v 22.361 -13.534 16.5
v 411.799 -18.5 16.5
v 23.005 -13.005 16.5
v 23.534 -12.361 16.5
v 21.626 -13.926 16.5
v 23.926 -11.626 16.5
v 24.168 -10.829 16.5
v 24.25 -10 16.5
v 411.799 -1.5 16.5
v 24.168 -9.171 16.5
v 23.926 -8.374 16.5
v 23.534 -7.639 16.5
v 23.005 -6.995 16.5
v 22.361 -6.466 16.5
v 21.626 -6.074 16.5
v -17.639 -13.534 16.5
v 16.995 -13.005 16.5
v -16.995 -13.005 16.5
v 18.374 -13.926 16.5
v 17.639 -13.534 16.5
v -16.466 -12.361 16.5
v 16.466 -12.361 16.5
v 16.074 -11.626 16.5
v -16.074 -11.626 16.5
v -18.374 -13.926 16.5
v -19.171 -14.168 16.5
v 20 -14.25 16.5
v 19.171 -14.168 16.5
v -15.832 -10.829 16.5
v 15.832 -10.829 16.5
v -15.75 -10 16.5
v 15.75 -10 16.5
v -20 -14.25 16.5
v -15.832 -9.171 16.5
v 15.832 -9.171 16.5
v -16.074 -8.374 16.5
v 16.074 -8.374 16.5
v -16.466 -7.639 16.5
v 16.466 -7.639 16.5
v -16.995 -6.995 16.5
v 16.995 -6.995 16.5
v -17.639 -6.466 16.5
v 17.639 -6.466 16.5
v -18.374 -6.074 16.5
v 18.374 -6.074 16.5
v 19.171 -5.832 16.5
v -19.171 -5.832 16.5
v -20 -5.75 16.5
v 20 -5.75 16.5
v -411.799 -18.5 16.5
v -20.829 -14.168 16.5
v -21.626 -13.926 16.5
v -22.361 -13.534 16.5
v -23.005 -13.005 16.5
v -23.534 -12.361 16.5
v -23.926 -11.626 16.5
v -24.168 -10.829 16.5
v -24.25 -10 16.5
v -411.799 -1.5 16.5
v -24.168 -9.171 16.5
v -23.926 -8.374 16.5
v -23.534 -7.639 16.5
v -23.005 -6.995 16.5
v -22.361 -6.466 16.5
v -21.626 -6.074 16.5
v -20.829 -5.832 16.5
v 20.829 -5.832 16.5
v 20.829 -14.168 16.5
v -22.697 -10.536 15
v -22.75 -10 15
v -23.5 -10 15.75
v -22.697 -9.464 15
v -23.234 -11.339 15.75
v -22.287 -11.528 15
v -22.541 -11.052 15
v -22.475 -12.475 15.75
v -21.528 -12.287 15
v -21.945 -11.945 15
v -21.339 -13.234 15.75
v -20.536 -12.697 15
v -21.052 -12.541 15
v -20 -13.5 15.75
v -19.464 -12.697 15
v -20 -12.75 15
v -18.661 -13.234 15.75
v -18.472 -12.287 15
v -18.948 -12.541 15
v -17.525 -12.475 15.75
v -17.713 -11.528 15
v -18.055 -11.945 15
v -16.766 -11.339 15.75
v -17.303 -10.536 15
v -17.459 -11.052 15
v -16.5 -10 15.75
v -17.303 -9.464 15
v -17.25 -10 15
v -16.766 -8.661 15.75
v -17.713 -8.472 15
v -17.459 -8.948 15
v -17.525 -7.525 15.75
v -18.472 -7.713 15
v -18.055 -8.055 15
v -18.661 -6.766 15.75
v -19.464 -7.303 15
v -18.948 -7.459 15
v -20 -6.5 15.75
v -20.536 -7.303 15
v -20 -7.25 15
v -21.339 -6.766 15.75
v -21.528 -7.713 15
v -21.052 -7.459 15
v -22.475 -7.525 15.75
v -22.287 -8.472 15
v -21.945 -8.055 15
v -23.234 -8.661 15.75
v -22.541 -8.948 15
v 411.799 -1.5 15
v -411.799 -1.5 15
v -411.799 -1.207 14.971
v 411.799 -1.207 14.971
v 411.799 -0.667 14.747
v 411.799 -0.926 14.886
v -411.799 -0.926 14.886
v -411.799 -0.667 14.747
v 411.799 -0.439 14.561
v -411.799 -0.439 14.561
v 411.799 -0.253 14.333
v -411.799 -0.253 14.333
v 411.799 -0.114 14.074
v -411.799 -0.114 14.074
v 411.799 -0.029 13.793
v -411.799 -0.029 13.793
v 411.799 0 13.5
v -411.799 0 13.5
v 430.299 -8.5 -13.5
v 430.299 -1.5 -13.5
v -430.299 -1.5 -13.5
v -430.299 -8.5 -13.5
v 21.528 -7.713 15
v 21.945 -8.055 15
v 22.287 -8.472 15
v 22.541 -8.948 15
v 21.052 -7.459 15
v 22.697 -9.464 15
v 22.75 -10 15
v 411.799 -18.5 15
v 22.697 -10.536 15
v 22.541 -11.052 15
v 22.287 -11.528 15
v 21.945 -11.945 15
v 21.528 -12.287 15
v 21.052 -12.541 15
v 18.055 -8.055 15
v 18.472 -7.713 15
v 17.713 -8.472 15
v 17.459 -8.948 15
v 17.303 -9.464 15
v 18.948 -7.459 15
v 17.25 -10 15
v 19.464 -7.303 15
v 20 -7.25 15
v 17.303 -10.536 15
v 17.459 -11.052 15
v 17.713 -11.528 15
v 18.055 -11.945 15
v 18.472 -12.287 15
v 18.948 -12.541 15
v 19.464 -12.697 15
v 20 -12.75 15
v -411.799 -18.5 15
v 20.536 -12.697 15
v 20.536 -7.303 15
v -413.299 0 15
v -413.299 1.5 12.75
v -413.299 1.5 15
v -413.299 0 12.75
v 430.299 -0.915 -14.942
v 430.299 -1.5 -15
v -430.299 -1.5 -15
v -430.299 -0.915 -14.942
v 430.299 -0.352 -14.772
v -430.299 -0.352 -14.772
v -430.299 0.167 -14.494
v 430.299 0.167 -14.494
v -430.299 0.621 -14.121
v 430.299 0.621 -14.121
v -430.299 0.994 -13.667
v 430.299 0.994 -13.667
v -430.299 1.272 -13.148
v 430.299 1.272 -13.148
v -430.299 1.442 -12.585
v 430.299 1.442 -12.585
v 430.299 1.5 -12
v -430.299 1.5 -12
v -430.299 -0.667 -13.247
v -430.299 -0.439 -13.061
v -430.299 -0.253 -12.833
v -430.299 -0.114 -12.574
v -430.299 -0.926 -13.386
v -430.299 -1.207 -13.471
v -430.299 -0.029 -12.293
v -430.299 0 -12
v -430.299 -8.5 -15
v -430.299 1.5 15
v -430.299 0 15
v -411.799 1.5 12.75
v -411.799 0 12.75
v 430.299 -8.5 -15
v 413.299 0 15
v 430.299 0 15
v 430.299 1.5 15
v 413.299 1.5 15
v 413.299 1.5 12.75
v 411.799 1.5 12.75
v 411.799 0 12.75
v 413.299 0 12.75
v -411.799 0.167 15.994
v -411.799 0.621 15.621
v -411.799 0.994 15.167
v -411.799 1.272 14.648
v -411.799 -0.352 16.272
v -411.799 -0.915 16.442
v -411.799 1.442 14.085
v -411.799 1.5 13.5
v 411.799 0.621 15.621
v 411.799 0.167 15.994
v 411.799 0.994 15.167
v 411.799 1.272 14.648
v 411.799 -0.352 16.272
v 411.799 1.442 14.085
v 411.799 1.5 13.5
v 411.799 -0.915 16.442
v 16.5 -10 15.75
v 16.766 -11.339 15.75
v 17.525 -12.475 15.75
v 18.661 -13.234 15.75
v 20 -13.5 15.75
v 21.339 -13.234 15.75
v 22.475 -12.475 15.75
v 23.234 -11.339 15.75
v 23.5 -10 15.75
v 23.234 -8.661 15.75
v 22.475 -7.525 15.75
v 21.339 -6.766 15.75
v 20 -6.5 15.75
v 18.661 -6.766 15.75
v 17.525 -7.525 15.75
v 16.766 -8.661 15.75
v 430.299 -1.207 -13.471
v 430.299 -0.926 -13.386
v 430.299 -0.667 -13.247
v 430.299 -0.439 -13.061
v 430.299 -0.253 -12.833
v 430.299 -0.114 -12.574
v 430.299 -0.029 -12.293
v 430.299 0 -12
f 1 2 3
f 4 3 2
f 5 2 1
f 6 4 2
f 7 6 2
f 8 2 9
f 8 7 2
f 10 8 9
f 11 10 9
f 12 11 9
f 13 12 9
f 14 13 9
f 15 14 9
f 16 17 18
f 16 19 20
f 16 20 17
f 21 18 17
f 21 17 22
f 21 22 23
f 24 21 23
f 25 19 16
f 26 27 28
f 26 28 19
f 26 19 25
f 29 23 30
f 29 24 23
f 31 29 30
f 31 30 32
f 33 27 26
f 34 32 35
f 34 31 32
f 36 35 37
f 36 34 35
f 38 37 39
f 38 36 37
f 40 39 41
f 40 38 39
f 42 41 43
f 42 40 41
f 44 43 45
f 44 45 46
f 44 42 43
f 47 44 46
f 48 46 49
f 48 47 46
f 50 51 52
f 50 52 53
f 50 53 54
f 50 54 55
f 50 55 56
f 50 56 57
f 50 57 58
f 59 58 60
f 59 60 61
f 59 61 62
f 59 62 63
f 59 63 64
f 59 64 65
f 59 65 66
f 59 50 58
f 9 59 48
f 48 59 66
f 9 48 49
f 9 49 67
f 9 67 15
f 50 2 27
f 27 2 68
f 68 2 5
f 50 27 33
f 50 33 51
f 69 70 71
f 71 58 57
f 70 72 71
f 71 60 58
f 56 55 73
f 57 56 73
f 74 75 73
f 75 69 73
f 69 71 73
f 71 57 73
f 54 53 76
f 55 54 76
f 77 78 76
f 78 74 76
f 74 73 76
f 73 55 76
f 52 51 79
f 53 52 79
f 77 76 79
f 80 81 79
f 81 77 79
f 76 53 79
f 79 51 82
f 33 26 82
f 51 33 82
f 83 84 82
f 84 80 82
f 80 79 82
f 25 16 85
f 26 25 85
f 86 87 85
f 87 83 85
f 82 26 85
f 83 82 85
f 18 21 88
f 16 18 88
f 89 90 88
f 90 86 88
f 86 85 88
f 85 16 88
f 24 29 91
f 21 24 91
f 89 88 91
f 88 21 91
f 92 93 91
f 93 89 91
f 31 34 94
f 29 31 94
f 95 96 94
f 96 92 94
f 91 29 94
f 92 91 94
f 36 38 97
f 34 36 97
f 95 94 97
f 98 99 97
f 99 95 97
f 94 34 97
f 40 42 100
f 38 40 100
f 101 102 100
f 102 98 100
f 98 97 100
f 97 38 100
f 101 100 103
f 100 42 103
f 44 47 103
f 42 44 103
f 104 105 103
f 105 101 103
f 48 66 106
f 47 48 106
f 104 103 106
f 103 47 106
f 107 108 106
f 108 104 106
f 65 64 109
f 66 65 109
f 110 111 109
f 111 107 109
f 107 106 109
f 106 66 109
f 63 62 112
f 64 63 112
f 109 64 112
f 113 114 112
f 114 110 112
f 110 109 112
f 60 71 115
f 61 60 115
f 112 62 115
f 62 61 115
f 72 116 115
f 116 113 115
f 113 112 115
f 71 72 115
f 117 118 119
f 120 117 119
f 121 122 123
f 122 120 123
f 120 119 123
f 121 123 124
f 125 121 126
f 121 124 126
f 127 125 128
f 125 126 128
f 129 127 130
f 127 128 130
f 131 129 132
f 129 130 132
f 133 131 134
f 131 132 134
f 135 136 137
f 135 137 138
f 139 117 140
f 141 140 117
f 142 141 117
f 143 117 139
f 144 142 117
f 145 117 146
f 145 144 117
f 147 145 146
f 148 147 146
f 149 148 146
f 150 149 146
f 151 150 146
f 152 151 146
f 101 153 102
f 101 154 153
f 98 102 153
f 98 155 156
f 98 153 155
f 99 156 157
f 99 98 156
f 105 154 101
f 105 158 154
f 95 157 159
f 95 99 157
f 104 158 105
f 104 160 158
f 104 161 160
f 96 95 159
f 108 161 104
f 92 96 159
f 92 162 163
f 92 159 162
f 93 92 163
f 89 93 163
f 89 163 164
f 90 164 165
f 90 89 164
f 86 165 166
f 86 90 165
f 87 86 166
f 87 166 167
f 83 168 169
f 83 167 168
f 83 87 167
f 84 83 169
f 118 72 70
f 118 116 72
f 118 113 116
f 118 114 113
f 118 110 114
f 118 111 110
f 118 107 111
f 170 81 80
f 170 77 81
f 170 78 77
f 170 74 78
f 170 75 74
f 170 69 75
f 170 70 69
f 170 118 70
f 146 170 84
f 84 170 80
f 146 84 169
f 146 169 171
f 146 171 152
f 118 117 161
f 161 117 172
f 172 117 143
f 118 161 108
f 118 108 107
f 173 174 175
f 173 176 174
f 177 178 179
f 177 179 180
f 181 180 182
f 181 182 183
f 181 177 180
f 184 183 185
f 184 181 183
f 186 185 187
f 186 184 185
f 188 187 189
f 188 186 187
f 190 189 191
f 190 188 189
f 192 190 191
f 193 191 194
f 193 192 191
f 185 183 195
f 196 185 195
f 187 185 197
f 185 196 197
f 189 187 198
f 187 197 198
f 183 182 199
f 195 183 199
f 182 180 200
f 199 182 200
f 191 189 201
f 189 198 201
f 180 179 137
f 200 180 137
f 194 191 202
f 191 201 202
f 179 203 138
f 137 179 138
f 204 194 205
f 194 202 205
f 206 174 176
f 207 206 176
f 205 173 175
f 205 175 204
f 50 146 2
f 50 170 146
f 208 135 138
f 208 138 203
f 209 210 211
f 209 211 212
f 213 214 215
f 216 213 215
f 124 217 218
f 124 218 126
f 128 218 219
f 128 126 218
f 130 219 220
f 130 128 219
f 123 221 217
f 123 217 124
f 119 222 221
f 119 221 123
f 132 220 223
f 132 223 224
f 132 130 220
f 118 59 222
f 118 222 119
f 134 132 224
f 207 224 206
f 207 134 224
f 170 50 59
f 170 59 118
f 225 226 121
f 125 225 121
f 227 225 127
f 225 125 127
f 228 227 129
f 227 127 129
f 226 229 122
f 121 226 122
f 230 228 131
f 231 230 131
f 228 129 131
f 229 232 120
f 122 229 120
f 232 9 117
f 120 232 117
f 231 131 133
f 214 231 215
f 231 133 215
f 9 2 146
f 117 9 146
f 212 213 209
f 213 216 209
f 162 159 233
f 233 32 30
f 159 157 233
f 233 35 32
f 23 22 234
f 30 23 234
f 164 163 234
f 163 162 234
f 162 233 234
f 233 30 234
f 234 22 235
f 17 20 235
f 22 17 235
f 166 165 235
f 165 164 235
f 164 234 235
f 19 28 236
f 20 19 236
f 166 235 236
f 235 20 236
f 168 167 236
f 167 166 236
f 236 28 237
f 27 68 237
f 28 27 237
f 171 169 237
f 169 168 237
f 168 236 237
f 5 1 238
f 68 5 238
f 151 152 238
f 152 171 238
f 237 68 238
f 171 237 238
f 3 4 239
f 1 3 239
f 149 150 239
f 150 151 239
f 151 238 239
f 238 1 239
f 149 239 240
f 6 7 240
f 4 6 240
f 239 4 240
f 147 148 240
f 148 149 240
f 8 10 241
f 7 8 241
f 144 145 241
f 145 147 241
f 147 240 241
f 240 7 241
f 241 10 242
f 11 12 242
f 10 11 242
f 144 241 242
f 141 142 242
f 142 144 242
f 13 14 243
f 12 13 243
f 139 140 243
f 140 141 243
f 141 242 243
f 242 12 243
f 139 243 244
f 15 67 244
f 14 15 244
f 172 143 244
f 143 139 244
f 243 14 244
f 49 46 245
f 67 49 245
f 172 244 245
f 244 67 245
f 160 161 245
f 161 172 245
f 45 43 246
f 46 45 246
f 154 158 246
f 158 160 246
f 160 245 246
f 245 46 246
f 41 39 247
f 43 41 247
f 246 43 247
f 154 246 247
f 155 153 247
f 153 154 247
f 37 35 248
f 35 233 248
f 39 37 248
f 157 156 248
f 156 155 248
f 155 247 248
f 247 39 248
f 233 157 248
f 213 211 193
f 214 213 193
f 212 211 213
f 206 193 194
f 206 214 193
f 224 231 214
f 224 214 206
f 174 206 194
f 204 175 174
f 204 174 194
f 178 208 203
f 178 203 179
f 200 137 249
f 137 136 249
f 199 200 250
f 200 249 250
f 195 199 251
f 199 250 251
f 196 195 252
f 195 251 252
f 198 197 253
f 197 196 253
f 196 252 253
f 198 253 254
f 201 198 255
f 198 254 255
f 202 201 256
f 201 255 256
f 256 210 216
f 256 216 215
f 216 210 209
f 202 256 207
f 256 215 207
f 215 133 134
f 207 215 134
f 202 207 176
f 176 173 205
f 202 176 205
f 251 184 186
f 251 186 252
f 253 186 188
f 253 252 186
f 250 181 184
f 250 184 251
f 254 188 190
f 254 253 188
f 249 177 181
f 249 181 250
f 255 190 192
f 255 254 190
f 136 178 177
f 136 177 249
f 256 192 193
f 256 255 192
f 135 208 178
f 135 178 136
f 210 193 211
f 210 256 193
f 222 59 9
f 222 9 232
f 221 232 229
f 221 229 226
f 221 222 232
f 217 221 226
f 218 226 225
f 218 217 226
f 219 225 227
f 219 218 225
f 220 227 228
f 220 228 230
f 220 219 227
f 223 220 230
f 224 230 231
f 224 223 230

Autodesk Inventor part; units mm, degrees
ref_plane "YZ Plane" through (0, 0, 0) normal (1, 0, 0) x (0, 1, 0)
ref_plane "XZ Plane" through (0, 0, 0) normal (0, 1, 0) x (-1, 0, 0)
ref_plane "XY Plane" through (0, 0, 0) normal (0, 0, 1) x (1, 0, 0)
sketch "Sketch2" plane through (0, 0, 0) normal (0, 1, 0) x (-1, 0, 0)
  line L0 (-430.299, 15) -> (430.299, 15)
  line L1 (430.299, 15) -> (430.299, -15)
  line L2 (430.299, -15) -> (-430.299, -15)
  line L3 (-430.299, -15) -> (-430.299, 15)
  line L4 (-430.299, 15) -> (430.299, -15) construction
  line L5 (430.299, 15) -> (-430.299, -15) construction
  point P0 (0, 0)
  dimension "d12" = 860.598
  dimension "d13" = 30
extrude "Plate2" add sketch "Sketch2" along normal blind 1.5
sketch "Sketch3" plane through (-430.299, 0, 15) normal (0, 0, 1) x (1, 0, 0)
  line L0 (842.098, 0) -> (18.5, 0)
  line L1 (18.5, 0) -> (18.5, -18.5)
  line L2 (18.5, -18.5) -> (842.098, -18.5)
  line L3 (842.098, -18.5) -> (842.098, 0)
edge flange "Flange1" height 20 angle 90 thickness 1.5 bend radius 1.5 thickness toward (0, 0, 1) relief straight relief width 1.5 relief depth 0.75 edges at (0, 0, 15) wall of the first edge with corners at (411.799, 0, 15) (-411.799, 0, 15) (-411.799, -18.5, 15) (411.799, -18.5, 15)
bend "Bend2"
corner "Corner2"
sketch "Sketch4" plane through (430.299, 1.5, -13.5) normal (0, 0, -1) x (-1, 0, 0)
  line L0 (860.598, 0) -> (0, 0)
  line L1 (0, 0) -> (0, -10)
  line L2 (0, -10) -> (860.598, -10)
  line L3 (860.598, -10) -> (860.598, 0)
edge flange "Flange2" height 10 angle 90 thickness 1.5 bend radius 1.5 thickness toward (0, 0, -1) relief tear relief width 1.5 relief depth 0.75 edges at (0, 0, -15) wall of the first edge with corners at (-430.299, 1.5, -13.5) (430.299, 1.5, -13.5) (430.299, -8.5, -13.5) (-430.299, -8.5, -13.5)
bend "Bend3"
corner "Corner3"
sketch "Sketch5" plane through (411.799, -18.5, 15) normal (0, 0, -1) x (-1, 0, 0)
  circle A0 centre (391.799, 8.5) radius 2.067 construction
  circle A1 centre (431.799, 8.5) radius 2.067 construction
  circle A2 centre (391.799, 8.5) radius 2.75
  circle A3 centre (431.799, 8.5) radius 2.75
  point P0 (411.799, 18.5)
  dimension "d36" = 5.5
  dimension "d37" = 5.5
extrude "Extrusion1" cut sketch "Sketch5" against normal blind 1.5
chamfer "Chamfer1" distance 1.5 angle 45 2 edges at (22.75, -10, 16.5) (-17.25, -10, 16.5)
equation "\"d38\" = Thickness"
equation "\"d15\" = BendReliefWidth"
equation "\"d16\" = BendReliefDepth"
equation "\"d17\" = MinimumRemnant"
equation "\"d18\" = BendRadius"
equation "\"d22\" = BendRadius"
equation "\"d23\" = CornerReliefSize"
equation "\"d24\" = GapSize"
equation "\"d25\" = JacobiRadiusSize"
equation "\"d26\" = BendReliefWidth"
equation "\"d27\" = BendReliefDepth"
equation "\"d28\" = MinimumRemnant"
equation "\"d29\" = BendRadius"
equation "\"d32\" = BendRadius"
equation "\"d33\" = CornerReliefSize"
equation "\"d34\" = GapSize"
equation "\"d35\" = JacobiRadiusSize"
equation "\"BendRadius\" = Thickness"
equation "\"BendReliefWidth\" = Thickness"
equation "\"BendReliefDepth\" = 0.5 * Thickness"
equation "\"CornerReliefSize\" = 4 * Thickness"
equation "\"MinimumRemnant\" = 2 * Thickness"
equation "\"TransitionRadius\" = BendRadius"
equation "\"JacobiRadiusSize\" = BendRadius"
equation "\"GapSize\" = Thickness"
equation "\"d14\" = BendRadius"
equation "\"Thickness\" = 1.5"
properties part number "Batente Sup." material "Stainless Steel"
